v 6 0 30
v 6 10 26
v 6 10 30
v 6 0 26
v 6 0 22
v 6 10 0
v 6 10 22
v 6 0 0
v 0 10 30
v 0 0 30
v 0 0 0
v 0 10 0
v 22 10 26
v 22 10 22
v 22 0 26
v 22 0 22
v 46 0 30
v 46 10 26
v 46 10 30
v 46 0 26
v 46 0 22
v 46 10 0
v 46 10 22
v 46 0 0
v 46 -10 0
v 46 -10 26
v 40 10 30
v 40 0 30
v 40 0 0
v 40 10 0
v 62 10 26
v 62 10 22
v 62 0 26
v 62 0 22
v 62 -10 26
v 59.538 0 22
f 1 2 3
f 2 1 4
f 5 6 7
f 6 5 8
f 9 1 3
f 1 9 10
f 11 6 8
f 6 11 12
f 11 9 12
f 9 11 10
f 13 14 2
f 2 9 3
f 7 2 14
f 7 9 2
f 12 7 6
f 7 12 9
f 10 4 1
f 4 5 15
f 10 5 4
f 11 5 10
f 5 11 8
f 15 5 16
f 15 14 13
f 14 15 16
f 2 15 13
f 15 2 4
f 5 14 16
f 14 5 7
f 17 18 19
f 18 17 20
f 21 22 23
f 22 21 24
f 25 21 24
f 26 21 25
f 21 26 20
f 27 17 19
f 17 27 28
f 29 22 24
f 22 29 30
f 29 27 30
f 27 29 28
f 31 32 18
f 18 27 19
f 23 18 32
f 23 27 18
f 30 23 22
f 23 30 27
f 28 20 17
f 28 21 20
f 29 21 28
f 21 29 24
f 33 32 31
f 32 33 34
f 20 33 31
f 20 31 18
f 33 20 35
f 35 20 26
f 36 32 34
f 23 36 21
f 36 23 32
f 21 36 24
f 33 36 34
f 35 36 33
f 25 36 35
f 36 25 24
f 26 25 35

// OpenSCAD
// Gusset vs freestanding shelf: two wall-mounted shelves side by side --
// one a freestanding flat shelf (unsupported overhang), one reinforced
// with a triangular gusset brace back to the wall.
wall_t = 6; depth = 10; wall_h = 30; shelf_len = 16; shelf_z = 22; shelf_h = 4;

module shelf(gusset) {
    union() {
        cube([wall_t, depth, wall_h]);
        translate([wall_t, 0, shelf_z]) cube([shelf_len, depth, shelf_h]);
        if (gusset) {
            translate([wall_t, 0, 0])
            rotate([90, 0, 0])
            linear_extrude(height = depth)
            polygon(points = [[0, 0], [0, shelf_z + shelf_h], [shelf_len, shelf_z + shelf_h]]);
        }
    }
}

shelf(false);
translate([40, 0, 0]) shelf(true);
